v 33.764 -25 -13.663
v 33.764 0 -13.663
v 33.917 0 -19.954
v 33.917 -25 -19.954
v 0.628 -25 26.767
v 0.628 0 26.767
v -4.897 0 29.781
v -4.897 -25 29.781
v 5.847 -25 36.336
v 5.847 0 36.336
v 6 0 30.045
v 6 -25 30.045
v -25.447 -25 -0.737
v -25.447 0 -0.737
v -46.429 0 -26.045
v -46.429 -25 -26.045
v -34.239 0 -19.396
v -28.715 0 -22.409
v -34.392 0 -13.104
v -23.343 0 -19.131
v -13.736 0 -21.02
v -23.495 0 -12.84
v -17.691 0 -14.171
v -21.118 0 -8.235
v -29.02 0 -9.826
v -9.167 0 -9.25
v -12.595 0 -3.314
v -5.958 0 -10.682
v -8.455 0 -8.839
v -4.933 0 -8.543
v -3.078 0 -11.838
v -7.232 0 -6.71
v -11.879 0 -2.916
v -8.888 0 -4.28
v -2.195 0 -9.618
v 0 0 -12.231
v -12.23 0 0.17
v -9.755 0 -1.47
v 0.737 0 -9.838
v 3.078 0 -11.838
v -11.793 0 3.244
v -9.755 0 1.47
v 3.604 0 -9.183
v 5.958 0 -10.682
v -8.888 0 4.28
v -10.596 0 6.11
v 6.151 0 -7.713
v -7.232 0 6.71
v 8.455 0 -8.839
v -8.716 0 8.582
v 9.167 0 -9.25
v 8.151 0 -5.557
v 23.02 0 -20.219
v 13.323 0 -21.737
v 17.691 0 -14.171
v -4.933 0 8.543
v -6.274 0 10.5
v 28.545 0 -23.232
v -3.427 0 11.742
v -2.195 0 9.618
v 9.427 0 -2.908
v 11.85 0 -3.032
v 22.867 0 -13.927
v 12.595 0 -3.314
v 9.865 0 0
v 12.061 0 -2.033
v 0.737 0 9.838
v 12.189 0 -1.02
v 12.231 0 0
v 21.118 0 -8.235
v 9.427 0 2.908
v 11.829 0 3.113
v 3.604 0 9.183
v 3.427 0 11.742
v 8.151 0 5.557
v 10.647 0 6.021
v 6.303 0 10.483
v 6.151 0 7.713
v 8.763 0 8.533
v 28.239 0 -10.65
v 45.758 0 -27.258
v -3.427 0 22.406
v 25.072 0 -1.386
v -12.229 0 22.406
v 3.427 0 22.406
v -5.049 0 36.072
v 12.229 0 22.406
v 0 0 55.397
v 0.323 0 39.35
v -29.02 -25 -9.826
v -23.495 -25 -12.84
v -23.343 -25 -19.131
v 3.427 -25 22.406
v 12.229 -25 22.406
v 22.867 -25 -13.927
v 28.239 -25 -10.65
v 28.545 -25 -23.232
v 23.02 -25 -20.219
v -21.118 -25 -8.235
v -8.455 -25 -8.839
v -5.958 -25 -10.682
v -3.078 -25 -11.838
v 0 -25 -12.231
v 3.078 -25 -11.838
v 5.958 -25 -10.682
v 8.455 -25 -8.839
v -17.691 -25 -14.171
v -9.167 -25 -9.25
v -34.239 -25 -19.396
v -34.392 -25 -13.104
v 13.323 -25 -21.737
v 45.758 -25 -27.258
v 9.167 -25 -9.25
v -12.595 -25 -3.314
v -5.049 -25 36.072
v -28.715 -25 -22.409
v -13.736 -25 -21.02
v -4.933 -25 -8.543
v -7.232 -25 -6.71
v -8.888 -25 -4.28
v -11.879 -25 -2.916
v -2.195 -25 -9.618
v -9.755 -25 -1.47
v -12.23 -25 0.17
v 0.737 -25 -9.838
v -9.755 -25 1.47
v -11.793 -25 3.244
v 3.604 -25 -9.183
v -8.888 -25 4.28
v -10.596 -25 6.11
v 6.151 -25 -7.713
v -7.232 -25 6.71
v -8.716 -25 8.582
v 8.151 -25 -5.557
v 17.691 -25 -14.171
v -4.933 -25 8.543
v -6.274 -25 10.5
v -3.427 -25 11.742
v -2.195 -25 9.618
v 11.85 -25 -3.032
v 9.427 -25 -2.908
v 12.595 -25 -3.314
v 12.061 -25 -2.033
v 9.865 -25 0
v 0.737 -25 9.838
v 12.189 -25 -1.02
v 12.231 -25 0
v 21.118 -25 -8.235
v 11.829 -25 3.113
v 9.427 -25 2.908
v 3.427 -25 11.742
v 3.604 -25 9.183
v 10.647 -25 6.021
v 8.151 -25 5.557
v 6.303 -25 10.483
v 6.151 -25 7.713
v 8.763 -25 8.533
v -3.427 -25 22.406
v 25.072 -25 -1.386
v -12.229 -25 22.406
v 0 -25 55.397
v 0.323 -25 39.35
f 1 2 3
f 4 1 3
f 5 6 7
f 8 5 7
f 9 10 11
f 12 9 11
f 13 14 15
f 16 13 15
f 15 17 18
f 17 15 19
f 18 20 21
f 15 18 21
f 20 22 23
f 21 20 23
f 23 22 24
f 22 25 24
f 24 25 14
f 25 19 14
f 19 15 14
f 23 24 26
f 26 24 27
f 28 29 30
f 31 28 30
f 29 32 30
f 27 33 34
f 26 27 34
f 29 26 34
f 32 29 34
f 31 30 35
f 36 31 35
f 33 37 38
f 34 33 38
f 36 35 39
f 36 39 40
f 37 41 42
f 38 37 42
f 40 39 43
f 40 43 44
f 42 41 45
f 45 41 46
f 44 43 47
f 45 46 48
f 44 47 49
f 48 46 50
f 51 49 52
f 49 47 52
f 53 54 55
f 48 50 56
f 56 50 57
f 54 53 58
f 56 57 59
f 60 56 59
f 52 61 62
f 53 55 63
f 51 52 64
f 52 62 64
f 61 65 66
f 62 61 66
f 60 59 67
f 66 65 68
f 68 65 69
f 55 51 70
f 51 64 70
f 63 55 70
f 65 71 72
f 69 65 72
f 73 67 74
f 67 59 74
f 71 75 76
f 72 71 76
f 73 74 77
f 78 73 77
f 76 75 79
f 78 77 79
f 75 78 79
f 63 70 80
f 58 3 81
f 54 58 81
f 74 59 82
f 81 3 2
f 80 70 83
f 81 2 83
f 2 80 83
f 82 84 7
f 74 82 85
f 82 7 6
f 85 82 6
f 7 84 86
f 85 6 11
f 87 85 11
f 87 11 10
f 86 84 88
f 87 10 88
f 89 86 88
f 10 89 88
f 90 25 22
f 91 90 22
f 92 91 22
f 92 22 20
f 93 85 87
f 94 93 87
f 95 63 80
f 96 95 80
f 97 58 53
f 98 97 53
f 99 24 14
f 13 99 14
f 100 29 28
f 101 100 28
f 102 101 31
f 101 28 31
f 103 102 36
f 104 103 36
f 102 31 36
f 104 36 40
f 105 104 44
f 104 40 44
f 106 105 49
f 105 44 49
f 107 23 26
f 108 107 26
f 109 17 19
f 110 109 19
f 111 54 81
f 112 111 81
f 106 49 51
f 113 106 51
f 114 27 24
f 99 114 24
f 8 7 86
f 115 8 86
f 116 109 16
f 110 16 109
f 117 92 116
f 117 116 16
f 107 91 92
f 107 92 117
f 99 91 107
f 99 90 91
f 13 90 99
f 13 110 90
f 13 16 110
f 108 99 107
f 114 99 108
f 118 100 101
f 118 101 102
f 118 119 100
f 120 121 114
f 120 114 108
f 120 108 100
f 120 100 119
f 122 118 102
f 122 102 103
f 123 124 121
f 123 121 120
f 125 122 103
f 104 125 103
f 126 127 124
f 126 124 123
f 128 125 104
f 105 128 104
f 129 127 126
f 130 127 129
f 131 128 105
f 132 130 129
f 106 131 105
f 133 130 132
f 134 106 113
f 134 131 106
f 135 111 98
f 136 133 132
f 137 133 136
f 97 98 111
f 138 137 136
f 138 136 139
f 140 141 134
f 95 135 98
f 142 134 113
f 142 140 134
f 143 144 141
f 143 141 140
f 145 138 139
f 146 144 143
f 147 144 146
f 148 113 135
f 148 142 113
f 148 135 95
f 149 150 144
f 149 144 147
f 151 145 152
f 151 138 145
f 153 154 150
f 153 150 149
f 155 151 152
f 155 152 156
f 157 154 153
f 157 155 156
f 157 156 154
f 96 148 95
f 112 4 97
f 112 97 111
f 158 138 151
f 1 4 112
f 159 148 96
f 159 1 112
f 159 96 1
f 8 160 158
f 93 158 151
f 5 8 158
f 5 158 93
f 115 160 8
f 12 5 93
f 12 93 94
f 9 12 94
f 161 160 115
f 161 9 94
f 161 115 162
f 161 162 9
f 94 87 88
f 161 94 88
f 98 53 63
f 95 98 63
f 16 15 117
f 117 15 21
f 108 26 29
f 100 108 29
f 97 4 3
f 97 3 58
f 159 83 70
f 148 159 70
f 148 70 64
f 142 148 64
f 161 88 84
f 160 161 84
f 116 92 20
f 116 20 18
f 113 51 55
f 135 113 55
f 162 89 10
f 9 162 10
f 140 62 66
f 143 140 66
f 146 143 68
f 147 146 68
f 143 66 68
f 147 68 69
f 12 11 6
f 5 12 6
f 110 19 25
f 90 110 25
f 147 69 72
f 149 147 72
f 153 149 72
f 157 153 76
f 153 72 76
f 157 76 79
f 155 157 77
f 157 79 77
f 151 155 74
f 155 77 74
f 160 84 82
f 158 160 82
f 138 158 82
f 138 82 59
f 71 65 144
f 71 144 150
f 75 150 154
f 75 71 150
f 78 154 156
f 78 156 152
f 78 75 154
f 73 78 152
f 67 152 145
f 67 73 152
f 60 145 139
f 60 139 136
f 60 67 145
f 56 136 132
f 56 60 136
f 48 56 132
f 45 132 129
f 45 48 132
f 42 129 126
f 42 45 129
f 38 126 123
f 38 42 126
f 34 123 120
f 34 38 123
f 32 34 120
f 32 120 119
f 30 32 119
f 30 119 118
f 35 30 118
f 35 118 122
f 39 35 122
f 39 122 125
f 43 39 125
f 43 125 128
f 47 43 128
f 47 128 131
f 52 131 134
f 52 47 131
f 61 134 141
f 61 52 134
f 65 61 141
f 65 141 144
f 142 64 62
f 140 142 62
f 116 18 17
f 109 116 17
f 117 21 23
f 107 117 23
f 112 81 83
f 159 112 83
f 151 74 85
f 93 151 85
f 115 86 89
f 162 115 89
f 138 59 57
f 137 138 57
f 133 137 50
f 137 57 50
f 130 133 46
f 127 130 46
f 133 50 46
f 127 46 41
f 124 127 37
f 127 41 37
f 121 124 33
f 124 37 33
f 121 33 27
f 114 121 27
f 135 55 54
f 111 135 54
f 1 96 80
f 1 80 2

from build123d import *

# Parameters (mm, degrees)
F0_R     = 9.865157
F1_DEPTH = 25


with BuildPart() as f1:
    # F0 (on Front) → F1 (new body)
    with BuildSketch(Plane.XZ):
        with BuildLine():
            ThreePointArc((-3.427112, 11.741537), (0, 12.231467), (3.427112, 11.741537))
            Line((3.427112, 11.741537), (3.427112, 12.56425))
            Line((3.427112, 12.56425), (3.427112, 22.406213))
            Line((3.427112, 22.406213), (12.229432, 22.406213))
            Line((12.229432, 22.406213), (0, 55.397243))
            Line((0, 55.397243), (-12.229432, 22.406213))
            Line((-12.229432, 22.406213), (-3.427112, 22.406213))
            Line((-3.427112, 22.406213), (-3.427112, 12.56425))
            Line((-3.427112, 12.56425), (-3.427112, 11.741537))
        make_face()
        Polygon((5.999969, 30.045177), (0.627875, 26.767383), (-4.896825, 29.780857), (-5.049431, 36.072124), (0.322664, 39.349918), (5.847364, 36.336445), align=None, mode=Mode.SUBTRACT)
        with BuildLine():
            ThreePointArc((-8.454913, -8.838734), (-10.589397, -6.121556), (-11.878826, -2.915866))
            Line((-11.878826, -2.915866), (-12.594515, -3.314159))
            Line((-12.594515, -3.314159), (-21.117905, -8.23514))
            Line((-21.117905, -8.23514), (-25.446913, -0.737079))
            Line((-25.446913, -0.737079), (-46.428616, -26.044891))
            Line((-46.428616, -26.044891), (-13.736432, -21.020227))
            Line((-13.736432, -21.020227), (-17.690794, -14.171072))
            Line((-17.690794, -14.171072), (-9.167404, -9.250091))
            Line((-9.167404, -9.250091), (-8.454913, -8.838734))
        make_face()
        Polygon((-23.342566, -19.131204), (-28.714661, -22.408998), (-34.239361, -19.395524), (-34.391966, -13.104257), (-29.019872, -9.826463), (-23.495171, -12.839936), align=None, mode=Mode.SUBTRACT)
        with BuildLine():
            Line((12.594515, -3.314159), (11.849696, -3.032078))
            ThreePointArc((11.849696, -3.032078), (10.55929, -6.173345), (8.454913, -8.838734))
            Line((8.454913, -8.838734), (9.167404, -9.250091))
            Line((9.167404, -9.250091), (17.690794, -14.171072))
            Line((17.690794, -14.171072), (13.322571, -21.737055))
            Line((13.322571, -21.737055), (45.757505, -27.258412))
            Line((45.757505, -27.258412), (25.072267, -1.385986))
            Line((25.072267, -1.385986), (21.117905, -8.23514))
            Line((21.117905, -8.23514), (12.594515, -3.314159))
        make_face()
        Polygon((28.239391, -10.649653), (33.764091, -13.663127), (33.916697, -19.954394), (28.544602, -23.232188), (23.019902, -20.218715), (22.867297, -13.927447), align=None, mode=Mode.SUBTRACT)
        with BuildLine():
            ThreePointArc((11.849696, -3.032078), (12.135649, -1.528009), (12.231467, 0))
            ThreePointArc((12.231467, 0), (9.785893, 7.337921), (3.427112, 11.741537))
            ThreePointArc((3.427112, 11.741537), (0, 12.231467), (-3.427112, 11.741537))
            ThreePointArc((-3.427112, 11.741537), (-10.596122, 6.109909), (-11.878826, -2.915866))
            ThreePointArc((-11.878826, -2.915866), (-10.589397, -6.121556), (-8.454913, -8.838734))
            ThreePointArc((-8.454913, -8.838734), (0, -12.231467), (8.454913, -8.838734))
            ThreePointArc((8.454913, -8.838734), (10.55929, -6.173345), (11.849696, -3.032078))
        make_face()
        Circle(F0_R, mode=Mode.SUBTRACT)
    extrude(amount=F1_DEPTH)


solid = f1.part
